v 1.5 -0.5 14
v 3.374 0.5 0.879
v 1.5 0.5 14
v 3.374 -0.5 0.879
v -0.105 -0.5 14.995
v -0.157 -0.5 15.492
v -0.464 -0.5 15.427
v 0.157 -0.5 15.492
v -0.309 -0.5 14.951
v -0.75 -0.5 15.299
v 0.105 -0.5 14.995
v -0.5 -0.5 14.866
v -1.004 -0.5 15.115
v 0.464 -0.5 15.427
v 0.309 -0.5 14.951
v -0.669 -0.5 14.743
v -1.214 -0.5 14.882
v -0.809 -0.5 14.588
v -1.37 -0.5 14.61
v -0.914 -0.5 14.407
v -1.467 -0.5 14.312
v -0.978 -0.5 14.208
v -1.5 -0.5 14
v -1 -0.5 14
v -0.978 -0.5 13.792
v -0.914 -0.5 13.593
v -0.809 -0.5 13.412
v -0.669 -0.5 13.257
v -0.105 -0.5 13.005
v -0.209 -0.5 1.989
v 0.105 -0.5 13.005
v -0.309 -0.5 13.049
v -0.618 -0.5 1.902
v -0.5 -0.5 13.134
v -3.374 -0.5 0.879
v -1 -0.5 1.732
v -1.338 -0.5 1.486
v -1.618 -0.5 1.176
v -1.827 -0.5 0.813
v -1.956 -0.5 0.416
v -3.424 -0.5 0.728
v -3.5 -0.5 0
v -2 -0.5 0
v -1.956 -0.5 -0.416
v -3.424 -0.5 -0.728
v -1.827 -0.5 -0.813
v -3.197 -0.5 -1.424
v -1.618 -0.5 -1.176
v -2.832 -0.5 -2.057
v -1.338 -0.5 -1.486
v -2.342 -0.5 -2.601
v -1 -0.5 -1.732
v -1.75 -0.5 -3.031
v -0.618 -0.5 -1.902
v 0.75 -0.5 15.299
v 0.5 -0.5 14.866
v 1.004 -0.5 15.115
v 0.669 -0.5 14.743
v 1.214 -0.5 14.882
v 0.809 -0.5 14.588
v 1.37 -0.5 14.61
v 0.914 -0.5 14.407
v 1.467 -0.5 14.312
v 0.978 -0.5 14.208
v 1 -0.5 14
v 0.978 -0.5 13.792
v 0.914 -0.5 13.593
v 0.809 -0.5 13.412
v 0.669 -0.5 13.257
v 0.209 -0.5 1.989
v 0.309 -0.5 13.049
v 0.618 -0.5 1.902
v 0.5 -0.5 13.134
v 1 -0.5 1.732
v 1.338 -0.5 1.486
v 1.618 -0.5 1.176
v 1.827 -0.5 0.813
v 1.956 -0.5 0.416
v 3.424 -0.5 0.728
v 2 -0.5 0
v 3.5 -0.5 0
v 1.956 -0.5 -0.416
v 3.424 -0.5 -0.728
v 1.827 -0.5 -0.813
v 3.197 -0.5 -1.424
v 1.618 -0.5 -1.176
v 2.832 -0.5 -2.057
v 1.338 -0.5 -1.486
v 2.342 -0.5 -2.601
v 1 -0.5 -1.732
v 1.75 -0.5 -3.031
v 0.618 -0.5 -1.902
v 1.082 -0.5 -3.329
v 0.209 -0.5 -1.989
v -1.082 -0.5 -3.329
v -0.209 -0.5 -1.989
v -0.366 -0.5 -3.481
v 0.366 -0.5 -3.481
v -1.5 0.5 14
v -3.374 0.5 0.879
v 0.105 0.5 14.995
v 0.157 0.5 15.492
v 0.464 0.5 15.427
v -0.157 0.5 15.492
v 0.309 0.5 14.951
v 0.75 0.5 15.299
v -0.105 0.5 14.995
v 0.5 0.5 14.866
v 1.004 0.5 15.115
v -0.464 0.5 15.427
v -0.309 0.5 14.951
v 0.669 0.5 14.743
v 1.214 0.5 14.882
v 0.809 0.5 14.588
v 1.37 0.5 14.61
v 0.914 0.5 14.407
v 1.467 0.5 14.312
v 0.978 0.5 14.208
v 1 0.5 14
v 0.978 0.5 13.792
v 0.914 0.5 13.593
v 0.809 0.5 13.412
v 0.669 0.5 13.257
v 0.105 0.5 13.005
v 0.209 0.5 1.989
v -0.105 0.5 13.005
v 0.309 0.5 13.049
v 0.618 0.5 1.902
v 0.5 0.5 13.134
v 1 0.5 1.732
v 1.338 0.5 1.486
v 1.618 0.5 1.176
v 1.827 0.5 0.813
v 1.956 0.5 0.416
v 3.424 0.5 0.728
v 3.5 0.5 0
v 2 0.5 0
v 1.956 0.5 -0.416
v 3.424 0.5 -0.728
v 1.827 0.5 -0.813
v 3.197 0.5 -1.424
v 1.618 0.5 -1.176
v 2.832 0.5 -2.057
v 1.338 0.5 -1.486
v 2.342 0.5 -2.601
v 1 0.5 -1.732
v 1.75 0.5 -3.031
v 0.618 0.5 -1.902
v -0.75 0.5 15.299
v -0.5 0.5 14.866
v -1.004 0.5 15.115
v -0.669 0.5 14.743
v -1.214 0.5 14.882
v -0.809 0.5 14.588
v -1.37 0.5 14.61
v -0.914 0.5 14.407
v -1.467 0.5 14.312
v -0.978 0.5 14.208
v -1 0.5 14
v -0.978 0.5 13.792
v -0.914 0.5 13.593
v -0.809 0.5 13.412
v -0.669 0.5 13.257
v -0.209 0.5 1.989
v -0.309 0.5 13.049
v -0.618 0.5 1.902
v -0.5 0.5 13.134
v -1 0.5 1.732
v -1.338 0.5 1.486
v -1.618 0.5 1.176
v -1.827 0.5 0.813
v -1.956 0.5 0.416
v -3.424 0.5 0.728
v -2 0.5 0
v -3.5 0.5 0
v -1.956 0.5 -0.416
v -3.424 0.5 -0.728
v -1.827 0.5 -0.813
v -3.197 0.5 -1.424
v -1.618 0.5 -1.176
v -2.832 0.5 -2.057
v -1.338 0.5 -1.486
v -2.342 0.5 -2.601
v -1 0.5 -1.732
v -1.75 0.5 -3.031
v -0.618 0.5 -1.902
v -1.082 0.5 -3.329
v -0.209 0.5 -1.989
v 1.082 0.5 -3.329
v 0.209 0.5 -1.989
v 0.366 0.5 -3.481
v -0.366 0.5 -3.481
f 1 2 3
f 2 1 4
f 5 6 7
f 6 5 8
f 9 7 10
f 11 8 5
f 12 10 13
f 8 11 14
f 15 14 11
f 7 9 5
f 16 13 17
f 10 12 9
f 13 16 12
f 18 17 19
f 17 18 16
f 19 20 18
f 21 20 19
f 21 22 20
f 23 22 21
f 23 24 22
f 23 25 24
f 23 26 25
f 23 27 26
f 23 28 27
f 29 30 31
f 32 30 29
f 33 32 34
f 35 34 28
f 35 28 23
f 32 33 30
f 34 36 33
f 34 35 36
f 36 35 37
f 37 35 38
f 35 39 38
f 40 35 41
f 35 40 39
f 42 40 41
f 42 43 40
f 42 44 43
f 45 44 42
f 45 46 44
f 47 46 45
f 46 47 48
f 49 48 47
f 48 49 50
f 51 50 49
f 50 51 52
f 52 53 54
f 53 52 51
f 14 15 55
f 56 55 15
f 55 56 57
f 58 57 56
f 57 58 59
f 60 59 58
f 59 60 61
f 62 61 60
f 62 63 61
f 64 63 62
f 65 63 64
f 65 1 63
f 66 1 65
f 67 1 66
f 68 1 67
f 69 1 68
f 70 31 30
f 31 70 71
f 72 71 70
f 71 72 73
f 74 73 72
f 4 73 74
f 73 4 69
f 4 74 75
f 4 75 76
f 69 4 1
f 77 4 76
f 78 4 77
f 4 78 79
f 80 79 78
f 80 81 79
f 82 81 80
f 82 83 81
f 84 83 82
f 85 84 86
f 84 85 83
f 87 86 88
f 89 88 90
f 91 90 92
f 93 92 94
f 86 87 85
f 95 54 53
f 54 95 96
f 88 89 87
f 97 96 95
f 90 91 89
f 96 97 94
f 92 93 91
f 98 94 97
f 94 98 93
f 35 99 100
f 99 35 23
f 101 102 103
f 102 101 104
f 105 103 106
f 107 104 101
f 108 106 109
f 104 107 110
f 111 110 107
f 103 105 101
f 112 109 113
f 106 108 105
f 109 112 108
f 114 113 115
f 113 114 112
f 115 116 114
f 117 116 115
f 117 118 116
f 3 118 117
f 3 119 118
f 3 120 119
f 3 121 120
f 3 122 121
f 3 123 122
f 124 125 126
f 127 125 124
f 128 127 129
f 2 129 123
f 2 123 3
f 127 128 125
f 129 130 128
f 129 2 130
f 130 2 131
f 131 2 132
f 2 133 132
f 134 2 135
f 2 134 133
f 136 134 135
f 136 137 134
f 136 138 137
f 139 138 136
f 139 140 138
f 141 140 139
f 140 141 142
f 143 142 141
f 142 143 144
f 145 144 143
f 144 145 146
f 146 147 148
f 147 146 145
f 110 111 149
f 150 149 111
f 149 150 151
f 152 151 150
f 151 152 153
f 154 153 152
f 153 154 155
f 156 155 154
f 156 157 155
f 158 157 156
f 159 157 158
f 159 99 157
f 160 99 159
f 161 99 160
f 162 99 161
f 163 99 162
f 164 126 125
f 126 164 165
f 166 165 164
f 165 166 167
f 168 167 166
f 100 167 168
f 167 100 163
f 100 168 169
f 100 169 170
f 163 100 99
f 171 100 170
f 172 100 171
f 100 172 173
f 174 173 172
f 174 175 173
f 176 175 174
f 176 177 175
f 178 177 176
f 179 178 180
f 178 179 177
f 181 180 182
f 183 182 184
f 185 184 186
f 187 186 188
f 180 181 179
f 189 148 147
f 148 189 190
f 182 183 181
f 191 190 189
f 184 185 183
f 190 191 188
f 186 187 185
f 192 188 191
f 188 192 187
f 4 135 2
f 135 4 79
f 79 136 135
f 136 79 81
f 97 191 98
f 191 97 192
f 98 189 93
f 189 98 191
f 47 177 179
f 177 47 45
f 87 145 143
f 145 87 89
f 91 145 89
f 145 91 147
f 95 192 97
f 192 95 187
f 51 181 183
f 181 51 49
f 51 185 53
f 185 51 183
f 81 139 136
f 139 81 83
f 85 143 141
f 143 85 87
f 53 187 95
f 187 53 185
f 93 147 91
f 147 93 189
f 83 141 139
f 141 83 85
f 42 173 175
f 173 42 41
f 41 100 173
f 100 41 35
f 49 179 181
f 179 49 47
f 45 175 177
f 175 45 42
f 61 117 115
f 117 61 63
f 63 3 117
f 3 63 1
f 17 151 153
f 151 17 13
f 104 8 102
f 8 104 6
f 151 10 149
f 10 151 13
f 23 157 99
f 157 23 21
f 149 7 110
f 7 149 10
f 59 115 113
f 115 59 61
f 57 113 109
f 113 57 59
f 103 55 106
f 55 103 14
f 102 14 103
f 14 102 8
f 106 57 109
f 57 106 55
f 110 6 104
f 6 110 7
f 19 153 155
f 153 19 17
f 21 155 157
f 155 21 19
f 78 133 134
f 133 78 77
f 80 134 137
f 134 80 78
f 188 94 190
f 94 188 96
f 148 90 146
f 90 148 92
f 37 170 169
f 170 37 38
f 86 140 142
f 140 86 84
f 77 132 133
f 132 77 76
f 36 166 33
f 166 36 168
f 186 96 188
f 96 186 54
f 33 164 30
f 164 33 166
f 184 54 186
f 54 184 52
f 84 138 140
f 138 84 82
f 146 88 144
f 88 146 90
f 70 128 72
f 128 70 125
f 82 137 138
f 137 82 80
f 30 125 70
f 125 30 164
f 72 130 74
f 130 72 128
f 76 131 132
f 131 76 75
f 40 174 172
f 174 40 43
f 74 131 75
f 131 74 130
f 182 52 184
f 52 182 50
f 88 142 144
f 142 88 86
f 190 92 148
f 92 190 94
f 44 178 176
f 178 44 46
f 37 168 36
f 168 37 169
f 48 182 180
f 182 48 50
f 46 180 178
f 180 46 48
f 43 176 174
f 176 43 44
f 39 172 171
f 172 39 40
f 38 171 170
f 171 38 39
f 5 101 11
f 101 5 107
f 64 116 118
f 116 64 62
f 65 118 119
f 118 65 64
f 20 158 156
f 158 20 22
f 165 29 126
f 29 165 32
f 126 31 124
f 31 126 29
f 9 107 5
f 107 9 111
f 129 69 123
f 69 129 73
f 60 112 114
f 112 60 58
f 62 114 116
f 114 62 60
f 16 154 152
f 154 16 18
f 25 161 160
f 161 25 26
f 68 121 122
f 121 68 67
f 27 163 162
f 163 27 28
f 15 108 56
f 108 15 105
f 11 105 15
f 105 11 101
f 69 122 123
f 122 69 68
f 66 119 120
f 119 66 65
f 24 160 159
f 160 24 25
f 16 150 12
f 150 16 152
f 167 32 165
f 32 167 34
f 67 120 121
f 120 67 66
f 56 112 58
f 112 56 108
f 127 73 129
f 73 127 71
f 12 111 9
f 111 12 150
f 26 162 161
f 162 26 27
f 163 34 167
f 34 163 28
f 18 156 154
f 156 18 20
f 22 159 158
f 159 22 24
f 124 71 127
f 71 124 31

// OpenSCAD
module Rod_01(){

    rotate([0,$t*360,0])  {
    translate([-3.5,0,4])
    difference(){
        union(){
            color("gray")
            translate([0,0,0])
            rotate([90,0,0])
            linear_extrude(1, scale = 1, center = true)
            polygon(points=[[0,-4],[7,-4],[5,10],[2,10]]);

            color("gray")
               rotate([90,0,0])  
               translate([3.5,-4,0])
               cylinder(1,3.5,3.5, $fn = 30, center = true);  
               
            color("gray")
               rotate([90,0,0])  
               translate([3.5,10,0])
               cylinder(1,1.5,1.5, $fn = 30, center = true);  
        }

        color("gray")
        rotate([90,0,0])  
        translate([3.5,-4,0])
        cylinder(2,2,2, $fn = 30, center = true);  
           
         color("gray")
         rotate([90,0,0])  
         translate([3.5,10,0])
         cylinder(2,1,1, $fn = 30, center = true);  

        }
    }
}

Rod_01();

// Written by Nicolì Angelo (Gengio) 2024: 
// MIT License

//Permission is hereby granted, free of charge, to any person obtaining a copy of this software and associated documentation files (the "Software"), to deal in the Software without restriction, including without limitation the rights to use, copy, modify, merge, publish, distribute, sublicense, and/or sell copies of the Software, and to permit persons to whom the Software is furnished to do so, subject to the following conditions:

//The above copyright notice and this permission notice shall be included in all copies or substantial portions of the Software.

//THE SOFTWARE IS PROVIDED "AS IS", WITHOUT WARRANTY OF ANY KIND, EXPRESS OR IMPLIED, INCLUDING BUT NOT LIMITED TO THE WARRANTIES OF MERCHANTABILITY, FITNESS FOR A PARTICULAR PURPOSE AND NONINFRINGEMENT. IN NO EVENT SHALL THE AUTHORS OR COPYRIGHT HOLDERS BE LIABLE FOR ANY CLAIM, DAMAGES OR OTHER LIABILITY, WHETHER IN AN ACTION OF CONTRACT, TORT OR OTHERWISE, ARISING FROM, OUT OF OR IN CONNECTION WITH THE SOFTWARE OR THE USE OR OTHER DEALINGS IN THE SOFTWARE.
